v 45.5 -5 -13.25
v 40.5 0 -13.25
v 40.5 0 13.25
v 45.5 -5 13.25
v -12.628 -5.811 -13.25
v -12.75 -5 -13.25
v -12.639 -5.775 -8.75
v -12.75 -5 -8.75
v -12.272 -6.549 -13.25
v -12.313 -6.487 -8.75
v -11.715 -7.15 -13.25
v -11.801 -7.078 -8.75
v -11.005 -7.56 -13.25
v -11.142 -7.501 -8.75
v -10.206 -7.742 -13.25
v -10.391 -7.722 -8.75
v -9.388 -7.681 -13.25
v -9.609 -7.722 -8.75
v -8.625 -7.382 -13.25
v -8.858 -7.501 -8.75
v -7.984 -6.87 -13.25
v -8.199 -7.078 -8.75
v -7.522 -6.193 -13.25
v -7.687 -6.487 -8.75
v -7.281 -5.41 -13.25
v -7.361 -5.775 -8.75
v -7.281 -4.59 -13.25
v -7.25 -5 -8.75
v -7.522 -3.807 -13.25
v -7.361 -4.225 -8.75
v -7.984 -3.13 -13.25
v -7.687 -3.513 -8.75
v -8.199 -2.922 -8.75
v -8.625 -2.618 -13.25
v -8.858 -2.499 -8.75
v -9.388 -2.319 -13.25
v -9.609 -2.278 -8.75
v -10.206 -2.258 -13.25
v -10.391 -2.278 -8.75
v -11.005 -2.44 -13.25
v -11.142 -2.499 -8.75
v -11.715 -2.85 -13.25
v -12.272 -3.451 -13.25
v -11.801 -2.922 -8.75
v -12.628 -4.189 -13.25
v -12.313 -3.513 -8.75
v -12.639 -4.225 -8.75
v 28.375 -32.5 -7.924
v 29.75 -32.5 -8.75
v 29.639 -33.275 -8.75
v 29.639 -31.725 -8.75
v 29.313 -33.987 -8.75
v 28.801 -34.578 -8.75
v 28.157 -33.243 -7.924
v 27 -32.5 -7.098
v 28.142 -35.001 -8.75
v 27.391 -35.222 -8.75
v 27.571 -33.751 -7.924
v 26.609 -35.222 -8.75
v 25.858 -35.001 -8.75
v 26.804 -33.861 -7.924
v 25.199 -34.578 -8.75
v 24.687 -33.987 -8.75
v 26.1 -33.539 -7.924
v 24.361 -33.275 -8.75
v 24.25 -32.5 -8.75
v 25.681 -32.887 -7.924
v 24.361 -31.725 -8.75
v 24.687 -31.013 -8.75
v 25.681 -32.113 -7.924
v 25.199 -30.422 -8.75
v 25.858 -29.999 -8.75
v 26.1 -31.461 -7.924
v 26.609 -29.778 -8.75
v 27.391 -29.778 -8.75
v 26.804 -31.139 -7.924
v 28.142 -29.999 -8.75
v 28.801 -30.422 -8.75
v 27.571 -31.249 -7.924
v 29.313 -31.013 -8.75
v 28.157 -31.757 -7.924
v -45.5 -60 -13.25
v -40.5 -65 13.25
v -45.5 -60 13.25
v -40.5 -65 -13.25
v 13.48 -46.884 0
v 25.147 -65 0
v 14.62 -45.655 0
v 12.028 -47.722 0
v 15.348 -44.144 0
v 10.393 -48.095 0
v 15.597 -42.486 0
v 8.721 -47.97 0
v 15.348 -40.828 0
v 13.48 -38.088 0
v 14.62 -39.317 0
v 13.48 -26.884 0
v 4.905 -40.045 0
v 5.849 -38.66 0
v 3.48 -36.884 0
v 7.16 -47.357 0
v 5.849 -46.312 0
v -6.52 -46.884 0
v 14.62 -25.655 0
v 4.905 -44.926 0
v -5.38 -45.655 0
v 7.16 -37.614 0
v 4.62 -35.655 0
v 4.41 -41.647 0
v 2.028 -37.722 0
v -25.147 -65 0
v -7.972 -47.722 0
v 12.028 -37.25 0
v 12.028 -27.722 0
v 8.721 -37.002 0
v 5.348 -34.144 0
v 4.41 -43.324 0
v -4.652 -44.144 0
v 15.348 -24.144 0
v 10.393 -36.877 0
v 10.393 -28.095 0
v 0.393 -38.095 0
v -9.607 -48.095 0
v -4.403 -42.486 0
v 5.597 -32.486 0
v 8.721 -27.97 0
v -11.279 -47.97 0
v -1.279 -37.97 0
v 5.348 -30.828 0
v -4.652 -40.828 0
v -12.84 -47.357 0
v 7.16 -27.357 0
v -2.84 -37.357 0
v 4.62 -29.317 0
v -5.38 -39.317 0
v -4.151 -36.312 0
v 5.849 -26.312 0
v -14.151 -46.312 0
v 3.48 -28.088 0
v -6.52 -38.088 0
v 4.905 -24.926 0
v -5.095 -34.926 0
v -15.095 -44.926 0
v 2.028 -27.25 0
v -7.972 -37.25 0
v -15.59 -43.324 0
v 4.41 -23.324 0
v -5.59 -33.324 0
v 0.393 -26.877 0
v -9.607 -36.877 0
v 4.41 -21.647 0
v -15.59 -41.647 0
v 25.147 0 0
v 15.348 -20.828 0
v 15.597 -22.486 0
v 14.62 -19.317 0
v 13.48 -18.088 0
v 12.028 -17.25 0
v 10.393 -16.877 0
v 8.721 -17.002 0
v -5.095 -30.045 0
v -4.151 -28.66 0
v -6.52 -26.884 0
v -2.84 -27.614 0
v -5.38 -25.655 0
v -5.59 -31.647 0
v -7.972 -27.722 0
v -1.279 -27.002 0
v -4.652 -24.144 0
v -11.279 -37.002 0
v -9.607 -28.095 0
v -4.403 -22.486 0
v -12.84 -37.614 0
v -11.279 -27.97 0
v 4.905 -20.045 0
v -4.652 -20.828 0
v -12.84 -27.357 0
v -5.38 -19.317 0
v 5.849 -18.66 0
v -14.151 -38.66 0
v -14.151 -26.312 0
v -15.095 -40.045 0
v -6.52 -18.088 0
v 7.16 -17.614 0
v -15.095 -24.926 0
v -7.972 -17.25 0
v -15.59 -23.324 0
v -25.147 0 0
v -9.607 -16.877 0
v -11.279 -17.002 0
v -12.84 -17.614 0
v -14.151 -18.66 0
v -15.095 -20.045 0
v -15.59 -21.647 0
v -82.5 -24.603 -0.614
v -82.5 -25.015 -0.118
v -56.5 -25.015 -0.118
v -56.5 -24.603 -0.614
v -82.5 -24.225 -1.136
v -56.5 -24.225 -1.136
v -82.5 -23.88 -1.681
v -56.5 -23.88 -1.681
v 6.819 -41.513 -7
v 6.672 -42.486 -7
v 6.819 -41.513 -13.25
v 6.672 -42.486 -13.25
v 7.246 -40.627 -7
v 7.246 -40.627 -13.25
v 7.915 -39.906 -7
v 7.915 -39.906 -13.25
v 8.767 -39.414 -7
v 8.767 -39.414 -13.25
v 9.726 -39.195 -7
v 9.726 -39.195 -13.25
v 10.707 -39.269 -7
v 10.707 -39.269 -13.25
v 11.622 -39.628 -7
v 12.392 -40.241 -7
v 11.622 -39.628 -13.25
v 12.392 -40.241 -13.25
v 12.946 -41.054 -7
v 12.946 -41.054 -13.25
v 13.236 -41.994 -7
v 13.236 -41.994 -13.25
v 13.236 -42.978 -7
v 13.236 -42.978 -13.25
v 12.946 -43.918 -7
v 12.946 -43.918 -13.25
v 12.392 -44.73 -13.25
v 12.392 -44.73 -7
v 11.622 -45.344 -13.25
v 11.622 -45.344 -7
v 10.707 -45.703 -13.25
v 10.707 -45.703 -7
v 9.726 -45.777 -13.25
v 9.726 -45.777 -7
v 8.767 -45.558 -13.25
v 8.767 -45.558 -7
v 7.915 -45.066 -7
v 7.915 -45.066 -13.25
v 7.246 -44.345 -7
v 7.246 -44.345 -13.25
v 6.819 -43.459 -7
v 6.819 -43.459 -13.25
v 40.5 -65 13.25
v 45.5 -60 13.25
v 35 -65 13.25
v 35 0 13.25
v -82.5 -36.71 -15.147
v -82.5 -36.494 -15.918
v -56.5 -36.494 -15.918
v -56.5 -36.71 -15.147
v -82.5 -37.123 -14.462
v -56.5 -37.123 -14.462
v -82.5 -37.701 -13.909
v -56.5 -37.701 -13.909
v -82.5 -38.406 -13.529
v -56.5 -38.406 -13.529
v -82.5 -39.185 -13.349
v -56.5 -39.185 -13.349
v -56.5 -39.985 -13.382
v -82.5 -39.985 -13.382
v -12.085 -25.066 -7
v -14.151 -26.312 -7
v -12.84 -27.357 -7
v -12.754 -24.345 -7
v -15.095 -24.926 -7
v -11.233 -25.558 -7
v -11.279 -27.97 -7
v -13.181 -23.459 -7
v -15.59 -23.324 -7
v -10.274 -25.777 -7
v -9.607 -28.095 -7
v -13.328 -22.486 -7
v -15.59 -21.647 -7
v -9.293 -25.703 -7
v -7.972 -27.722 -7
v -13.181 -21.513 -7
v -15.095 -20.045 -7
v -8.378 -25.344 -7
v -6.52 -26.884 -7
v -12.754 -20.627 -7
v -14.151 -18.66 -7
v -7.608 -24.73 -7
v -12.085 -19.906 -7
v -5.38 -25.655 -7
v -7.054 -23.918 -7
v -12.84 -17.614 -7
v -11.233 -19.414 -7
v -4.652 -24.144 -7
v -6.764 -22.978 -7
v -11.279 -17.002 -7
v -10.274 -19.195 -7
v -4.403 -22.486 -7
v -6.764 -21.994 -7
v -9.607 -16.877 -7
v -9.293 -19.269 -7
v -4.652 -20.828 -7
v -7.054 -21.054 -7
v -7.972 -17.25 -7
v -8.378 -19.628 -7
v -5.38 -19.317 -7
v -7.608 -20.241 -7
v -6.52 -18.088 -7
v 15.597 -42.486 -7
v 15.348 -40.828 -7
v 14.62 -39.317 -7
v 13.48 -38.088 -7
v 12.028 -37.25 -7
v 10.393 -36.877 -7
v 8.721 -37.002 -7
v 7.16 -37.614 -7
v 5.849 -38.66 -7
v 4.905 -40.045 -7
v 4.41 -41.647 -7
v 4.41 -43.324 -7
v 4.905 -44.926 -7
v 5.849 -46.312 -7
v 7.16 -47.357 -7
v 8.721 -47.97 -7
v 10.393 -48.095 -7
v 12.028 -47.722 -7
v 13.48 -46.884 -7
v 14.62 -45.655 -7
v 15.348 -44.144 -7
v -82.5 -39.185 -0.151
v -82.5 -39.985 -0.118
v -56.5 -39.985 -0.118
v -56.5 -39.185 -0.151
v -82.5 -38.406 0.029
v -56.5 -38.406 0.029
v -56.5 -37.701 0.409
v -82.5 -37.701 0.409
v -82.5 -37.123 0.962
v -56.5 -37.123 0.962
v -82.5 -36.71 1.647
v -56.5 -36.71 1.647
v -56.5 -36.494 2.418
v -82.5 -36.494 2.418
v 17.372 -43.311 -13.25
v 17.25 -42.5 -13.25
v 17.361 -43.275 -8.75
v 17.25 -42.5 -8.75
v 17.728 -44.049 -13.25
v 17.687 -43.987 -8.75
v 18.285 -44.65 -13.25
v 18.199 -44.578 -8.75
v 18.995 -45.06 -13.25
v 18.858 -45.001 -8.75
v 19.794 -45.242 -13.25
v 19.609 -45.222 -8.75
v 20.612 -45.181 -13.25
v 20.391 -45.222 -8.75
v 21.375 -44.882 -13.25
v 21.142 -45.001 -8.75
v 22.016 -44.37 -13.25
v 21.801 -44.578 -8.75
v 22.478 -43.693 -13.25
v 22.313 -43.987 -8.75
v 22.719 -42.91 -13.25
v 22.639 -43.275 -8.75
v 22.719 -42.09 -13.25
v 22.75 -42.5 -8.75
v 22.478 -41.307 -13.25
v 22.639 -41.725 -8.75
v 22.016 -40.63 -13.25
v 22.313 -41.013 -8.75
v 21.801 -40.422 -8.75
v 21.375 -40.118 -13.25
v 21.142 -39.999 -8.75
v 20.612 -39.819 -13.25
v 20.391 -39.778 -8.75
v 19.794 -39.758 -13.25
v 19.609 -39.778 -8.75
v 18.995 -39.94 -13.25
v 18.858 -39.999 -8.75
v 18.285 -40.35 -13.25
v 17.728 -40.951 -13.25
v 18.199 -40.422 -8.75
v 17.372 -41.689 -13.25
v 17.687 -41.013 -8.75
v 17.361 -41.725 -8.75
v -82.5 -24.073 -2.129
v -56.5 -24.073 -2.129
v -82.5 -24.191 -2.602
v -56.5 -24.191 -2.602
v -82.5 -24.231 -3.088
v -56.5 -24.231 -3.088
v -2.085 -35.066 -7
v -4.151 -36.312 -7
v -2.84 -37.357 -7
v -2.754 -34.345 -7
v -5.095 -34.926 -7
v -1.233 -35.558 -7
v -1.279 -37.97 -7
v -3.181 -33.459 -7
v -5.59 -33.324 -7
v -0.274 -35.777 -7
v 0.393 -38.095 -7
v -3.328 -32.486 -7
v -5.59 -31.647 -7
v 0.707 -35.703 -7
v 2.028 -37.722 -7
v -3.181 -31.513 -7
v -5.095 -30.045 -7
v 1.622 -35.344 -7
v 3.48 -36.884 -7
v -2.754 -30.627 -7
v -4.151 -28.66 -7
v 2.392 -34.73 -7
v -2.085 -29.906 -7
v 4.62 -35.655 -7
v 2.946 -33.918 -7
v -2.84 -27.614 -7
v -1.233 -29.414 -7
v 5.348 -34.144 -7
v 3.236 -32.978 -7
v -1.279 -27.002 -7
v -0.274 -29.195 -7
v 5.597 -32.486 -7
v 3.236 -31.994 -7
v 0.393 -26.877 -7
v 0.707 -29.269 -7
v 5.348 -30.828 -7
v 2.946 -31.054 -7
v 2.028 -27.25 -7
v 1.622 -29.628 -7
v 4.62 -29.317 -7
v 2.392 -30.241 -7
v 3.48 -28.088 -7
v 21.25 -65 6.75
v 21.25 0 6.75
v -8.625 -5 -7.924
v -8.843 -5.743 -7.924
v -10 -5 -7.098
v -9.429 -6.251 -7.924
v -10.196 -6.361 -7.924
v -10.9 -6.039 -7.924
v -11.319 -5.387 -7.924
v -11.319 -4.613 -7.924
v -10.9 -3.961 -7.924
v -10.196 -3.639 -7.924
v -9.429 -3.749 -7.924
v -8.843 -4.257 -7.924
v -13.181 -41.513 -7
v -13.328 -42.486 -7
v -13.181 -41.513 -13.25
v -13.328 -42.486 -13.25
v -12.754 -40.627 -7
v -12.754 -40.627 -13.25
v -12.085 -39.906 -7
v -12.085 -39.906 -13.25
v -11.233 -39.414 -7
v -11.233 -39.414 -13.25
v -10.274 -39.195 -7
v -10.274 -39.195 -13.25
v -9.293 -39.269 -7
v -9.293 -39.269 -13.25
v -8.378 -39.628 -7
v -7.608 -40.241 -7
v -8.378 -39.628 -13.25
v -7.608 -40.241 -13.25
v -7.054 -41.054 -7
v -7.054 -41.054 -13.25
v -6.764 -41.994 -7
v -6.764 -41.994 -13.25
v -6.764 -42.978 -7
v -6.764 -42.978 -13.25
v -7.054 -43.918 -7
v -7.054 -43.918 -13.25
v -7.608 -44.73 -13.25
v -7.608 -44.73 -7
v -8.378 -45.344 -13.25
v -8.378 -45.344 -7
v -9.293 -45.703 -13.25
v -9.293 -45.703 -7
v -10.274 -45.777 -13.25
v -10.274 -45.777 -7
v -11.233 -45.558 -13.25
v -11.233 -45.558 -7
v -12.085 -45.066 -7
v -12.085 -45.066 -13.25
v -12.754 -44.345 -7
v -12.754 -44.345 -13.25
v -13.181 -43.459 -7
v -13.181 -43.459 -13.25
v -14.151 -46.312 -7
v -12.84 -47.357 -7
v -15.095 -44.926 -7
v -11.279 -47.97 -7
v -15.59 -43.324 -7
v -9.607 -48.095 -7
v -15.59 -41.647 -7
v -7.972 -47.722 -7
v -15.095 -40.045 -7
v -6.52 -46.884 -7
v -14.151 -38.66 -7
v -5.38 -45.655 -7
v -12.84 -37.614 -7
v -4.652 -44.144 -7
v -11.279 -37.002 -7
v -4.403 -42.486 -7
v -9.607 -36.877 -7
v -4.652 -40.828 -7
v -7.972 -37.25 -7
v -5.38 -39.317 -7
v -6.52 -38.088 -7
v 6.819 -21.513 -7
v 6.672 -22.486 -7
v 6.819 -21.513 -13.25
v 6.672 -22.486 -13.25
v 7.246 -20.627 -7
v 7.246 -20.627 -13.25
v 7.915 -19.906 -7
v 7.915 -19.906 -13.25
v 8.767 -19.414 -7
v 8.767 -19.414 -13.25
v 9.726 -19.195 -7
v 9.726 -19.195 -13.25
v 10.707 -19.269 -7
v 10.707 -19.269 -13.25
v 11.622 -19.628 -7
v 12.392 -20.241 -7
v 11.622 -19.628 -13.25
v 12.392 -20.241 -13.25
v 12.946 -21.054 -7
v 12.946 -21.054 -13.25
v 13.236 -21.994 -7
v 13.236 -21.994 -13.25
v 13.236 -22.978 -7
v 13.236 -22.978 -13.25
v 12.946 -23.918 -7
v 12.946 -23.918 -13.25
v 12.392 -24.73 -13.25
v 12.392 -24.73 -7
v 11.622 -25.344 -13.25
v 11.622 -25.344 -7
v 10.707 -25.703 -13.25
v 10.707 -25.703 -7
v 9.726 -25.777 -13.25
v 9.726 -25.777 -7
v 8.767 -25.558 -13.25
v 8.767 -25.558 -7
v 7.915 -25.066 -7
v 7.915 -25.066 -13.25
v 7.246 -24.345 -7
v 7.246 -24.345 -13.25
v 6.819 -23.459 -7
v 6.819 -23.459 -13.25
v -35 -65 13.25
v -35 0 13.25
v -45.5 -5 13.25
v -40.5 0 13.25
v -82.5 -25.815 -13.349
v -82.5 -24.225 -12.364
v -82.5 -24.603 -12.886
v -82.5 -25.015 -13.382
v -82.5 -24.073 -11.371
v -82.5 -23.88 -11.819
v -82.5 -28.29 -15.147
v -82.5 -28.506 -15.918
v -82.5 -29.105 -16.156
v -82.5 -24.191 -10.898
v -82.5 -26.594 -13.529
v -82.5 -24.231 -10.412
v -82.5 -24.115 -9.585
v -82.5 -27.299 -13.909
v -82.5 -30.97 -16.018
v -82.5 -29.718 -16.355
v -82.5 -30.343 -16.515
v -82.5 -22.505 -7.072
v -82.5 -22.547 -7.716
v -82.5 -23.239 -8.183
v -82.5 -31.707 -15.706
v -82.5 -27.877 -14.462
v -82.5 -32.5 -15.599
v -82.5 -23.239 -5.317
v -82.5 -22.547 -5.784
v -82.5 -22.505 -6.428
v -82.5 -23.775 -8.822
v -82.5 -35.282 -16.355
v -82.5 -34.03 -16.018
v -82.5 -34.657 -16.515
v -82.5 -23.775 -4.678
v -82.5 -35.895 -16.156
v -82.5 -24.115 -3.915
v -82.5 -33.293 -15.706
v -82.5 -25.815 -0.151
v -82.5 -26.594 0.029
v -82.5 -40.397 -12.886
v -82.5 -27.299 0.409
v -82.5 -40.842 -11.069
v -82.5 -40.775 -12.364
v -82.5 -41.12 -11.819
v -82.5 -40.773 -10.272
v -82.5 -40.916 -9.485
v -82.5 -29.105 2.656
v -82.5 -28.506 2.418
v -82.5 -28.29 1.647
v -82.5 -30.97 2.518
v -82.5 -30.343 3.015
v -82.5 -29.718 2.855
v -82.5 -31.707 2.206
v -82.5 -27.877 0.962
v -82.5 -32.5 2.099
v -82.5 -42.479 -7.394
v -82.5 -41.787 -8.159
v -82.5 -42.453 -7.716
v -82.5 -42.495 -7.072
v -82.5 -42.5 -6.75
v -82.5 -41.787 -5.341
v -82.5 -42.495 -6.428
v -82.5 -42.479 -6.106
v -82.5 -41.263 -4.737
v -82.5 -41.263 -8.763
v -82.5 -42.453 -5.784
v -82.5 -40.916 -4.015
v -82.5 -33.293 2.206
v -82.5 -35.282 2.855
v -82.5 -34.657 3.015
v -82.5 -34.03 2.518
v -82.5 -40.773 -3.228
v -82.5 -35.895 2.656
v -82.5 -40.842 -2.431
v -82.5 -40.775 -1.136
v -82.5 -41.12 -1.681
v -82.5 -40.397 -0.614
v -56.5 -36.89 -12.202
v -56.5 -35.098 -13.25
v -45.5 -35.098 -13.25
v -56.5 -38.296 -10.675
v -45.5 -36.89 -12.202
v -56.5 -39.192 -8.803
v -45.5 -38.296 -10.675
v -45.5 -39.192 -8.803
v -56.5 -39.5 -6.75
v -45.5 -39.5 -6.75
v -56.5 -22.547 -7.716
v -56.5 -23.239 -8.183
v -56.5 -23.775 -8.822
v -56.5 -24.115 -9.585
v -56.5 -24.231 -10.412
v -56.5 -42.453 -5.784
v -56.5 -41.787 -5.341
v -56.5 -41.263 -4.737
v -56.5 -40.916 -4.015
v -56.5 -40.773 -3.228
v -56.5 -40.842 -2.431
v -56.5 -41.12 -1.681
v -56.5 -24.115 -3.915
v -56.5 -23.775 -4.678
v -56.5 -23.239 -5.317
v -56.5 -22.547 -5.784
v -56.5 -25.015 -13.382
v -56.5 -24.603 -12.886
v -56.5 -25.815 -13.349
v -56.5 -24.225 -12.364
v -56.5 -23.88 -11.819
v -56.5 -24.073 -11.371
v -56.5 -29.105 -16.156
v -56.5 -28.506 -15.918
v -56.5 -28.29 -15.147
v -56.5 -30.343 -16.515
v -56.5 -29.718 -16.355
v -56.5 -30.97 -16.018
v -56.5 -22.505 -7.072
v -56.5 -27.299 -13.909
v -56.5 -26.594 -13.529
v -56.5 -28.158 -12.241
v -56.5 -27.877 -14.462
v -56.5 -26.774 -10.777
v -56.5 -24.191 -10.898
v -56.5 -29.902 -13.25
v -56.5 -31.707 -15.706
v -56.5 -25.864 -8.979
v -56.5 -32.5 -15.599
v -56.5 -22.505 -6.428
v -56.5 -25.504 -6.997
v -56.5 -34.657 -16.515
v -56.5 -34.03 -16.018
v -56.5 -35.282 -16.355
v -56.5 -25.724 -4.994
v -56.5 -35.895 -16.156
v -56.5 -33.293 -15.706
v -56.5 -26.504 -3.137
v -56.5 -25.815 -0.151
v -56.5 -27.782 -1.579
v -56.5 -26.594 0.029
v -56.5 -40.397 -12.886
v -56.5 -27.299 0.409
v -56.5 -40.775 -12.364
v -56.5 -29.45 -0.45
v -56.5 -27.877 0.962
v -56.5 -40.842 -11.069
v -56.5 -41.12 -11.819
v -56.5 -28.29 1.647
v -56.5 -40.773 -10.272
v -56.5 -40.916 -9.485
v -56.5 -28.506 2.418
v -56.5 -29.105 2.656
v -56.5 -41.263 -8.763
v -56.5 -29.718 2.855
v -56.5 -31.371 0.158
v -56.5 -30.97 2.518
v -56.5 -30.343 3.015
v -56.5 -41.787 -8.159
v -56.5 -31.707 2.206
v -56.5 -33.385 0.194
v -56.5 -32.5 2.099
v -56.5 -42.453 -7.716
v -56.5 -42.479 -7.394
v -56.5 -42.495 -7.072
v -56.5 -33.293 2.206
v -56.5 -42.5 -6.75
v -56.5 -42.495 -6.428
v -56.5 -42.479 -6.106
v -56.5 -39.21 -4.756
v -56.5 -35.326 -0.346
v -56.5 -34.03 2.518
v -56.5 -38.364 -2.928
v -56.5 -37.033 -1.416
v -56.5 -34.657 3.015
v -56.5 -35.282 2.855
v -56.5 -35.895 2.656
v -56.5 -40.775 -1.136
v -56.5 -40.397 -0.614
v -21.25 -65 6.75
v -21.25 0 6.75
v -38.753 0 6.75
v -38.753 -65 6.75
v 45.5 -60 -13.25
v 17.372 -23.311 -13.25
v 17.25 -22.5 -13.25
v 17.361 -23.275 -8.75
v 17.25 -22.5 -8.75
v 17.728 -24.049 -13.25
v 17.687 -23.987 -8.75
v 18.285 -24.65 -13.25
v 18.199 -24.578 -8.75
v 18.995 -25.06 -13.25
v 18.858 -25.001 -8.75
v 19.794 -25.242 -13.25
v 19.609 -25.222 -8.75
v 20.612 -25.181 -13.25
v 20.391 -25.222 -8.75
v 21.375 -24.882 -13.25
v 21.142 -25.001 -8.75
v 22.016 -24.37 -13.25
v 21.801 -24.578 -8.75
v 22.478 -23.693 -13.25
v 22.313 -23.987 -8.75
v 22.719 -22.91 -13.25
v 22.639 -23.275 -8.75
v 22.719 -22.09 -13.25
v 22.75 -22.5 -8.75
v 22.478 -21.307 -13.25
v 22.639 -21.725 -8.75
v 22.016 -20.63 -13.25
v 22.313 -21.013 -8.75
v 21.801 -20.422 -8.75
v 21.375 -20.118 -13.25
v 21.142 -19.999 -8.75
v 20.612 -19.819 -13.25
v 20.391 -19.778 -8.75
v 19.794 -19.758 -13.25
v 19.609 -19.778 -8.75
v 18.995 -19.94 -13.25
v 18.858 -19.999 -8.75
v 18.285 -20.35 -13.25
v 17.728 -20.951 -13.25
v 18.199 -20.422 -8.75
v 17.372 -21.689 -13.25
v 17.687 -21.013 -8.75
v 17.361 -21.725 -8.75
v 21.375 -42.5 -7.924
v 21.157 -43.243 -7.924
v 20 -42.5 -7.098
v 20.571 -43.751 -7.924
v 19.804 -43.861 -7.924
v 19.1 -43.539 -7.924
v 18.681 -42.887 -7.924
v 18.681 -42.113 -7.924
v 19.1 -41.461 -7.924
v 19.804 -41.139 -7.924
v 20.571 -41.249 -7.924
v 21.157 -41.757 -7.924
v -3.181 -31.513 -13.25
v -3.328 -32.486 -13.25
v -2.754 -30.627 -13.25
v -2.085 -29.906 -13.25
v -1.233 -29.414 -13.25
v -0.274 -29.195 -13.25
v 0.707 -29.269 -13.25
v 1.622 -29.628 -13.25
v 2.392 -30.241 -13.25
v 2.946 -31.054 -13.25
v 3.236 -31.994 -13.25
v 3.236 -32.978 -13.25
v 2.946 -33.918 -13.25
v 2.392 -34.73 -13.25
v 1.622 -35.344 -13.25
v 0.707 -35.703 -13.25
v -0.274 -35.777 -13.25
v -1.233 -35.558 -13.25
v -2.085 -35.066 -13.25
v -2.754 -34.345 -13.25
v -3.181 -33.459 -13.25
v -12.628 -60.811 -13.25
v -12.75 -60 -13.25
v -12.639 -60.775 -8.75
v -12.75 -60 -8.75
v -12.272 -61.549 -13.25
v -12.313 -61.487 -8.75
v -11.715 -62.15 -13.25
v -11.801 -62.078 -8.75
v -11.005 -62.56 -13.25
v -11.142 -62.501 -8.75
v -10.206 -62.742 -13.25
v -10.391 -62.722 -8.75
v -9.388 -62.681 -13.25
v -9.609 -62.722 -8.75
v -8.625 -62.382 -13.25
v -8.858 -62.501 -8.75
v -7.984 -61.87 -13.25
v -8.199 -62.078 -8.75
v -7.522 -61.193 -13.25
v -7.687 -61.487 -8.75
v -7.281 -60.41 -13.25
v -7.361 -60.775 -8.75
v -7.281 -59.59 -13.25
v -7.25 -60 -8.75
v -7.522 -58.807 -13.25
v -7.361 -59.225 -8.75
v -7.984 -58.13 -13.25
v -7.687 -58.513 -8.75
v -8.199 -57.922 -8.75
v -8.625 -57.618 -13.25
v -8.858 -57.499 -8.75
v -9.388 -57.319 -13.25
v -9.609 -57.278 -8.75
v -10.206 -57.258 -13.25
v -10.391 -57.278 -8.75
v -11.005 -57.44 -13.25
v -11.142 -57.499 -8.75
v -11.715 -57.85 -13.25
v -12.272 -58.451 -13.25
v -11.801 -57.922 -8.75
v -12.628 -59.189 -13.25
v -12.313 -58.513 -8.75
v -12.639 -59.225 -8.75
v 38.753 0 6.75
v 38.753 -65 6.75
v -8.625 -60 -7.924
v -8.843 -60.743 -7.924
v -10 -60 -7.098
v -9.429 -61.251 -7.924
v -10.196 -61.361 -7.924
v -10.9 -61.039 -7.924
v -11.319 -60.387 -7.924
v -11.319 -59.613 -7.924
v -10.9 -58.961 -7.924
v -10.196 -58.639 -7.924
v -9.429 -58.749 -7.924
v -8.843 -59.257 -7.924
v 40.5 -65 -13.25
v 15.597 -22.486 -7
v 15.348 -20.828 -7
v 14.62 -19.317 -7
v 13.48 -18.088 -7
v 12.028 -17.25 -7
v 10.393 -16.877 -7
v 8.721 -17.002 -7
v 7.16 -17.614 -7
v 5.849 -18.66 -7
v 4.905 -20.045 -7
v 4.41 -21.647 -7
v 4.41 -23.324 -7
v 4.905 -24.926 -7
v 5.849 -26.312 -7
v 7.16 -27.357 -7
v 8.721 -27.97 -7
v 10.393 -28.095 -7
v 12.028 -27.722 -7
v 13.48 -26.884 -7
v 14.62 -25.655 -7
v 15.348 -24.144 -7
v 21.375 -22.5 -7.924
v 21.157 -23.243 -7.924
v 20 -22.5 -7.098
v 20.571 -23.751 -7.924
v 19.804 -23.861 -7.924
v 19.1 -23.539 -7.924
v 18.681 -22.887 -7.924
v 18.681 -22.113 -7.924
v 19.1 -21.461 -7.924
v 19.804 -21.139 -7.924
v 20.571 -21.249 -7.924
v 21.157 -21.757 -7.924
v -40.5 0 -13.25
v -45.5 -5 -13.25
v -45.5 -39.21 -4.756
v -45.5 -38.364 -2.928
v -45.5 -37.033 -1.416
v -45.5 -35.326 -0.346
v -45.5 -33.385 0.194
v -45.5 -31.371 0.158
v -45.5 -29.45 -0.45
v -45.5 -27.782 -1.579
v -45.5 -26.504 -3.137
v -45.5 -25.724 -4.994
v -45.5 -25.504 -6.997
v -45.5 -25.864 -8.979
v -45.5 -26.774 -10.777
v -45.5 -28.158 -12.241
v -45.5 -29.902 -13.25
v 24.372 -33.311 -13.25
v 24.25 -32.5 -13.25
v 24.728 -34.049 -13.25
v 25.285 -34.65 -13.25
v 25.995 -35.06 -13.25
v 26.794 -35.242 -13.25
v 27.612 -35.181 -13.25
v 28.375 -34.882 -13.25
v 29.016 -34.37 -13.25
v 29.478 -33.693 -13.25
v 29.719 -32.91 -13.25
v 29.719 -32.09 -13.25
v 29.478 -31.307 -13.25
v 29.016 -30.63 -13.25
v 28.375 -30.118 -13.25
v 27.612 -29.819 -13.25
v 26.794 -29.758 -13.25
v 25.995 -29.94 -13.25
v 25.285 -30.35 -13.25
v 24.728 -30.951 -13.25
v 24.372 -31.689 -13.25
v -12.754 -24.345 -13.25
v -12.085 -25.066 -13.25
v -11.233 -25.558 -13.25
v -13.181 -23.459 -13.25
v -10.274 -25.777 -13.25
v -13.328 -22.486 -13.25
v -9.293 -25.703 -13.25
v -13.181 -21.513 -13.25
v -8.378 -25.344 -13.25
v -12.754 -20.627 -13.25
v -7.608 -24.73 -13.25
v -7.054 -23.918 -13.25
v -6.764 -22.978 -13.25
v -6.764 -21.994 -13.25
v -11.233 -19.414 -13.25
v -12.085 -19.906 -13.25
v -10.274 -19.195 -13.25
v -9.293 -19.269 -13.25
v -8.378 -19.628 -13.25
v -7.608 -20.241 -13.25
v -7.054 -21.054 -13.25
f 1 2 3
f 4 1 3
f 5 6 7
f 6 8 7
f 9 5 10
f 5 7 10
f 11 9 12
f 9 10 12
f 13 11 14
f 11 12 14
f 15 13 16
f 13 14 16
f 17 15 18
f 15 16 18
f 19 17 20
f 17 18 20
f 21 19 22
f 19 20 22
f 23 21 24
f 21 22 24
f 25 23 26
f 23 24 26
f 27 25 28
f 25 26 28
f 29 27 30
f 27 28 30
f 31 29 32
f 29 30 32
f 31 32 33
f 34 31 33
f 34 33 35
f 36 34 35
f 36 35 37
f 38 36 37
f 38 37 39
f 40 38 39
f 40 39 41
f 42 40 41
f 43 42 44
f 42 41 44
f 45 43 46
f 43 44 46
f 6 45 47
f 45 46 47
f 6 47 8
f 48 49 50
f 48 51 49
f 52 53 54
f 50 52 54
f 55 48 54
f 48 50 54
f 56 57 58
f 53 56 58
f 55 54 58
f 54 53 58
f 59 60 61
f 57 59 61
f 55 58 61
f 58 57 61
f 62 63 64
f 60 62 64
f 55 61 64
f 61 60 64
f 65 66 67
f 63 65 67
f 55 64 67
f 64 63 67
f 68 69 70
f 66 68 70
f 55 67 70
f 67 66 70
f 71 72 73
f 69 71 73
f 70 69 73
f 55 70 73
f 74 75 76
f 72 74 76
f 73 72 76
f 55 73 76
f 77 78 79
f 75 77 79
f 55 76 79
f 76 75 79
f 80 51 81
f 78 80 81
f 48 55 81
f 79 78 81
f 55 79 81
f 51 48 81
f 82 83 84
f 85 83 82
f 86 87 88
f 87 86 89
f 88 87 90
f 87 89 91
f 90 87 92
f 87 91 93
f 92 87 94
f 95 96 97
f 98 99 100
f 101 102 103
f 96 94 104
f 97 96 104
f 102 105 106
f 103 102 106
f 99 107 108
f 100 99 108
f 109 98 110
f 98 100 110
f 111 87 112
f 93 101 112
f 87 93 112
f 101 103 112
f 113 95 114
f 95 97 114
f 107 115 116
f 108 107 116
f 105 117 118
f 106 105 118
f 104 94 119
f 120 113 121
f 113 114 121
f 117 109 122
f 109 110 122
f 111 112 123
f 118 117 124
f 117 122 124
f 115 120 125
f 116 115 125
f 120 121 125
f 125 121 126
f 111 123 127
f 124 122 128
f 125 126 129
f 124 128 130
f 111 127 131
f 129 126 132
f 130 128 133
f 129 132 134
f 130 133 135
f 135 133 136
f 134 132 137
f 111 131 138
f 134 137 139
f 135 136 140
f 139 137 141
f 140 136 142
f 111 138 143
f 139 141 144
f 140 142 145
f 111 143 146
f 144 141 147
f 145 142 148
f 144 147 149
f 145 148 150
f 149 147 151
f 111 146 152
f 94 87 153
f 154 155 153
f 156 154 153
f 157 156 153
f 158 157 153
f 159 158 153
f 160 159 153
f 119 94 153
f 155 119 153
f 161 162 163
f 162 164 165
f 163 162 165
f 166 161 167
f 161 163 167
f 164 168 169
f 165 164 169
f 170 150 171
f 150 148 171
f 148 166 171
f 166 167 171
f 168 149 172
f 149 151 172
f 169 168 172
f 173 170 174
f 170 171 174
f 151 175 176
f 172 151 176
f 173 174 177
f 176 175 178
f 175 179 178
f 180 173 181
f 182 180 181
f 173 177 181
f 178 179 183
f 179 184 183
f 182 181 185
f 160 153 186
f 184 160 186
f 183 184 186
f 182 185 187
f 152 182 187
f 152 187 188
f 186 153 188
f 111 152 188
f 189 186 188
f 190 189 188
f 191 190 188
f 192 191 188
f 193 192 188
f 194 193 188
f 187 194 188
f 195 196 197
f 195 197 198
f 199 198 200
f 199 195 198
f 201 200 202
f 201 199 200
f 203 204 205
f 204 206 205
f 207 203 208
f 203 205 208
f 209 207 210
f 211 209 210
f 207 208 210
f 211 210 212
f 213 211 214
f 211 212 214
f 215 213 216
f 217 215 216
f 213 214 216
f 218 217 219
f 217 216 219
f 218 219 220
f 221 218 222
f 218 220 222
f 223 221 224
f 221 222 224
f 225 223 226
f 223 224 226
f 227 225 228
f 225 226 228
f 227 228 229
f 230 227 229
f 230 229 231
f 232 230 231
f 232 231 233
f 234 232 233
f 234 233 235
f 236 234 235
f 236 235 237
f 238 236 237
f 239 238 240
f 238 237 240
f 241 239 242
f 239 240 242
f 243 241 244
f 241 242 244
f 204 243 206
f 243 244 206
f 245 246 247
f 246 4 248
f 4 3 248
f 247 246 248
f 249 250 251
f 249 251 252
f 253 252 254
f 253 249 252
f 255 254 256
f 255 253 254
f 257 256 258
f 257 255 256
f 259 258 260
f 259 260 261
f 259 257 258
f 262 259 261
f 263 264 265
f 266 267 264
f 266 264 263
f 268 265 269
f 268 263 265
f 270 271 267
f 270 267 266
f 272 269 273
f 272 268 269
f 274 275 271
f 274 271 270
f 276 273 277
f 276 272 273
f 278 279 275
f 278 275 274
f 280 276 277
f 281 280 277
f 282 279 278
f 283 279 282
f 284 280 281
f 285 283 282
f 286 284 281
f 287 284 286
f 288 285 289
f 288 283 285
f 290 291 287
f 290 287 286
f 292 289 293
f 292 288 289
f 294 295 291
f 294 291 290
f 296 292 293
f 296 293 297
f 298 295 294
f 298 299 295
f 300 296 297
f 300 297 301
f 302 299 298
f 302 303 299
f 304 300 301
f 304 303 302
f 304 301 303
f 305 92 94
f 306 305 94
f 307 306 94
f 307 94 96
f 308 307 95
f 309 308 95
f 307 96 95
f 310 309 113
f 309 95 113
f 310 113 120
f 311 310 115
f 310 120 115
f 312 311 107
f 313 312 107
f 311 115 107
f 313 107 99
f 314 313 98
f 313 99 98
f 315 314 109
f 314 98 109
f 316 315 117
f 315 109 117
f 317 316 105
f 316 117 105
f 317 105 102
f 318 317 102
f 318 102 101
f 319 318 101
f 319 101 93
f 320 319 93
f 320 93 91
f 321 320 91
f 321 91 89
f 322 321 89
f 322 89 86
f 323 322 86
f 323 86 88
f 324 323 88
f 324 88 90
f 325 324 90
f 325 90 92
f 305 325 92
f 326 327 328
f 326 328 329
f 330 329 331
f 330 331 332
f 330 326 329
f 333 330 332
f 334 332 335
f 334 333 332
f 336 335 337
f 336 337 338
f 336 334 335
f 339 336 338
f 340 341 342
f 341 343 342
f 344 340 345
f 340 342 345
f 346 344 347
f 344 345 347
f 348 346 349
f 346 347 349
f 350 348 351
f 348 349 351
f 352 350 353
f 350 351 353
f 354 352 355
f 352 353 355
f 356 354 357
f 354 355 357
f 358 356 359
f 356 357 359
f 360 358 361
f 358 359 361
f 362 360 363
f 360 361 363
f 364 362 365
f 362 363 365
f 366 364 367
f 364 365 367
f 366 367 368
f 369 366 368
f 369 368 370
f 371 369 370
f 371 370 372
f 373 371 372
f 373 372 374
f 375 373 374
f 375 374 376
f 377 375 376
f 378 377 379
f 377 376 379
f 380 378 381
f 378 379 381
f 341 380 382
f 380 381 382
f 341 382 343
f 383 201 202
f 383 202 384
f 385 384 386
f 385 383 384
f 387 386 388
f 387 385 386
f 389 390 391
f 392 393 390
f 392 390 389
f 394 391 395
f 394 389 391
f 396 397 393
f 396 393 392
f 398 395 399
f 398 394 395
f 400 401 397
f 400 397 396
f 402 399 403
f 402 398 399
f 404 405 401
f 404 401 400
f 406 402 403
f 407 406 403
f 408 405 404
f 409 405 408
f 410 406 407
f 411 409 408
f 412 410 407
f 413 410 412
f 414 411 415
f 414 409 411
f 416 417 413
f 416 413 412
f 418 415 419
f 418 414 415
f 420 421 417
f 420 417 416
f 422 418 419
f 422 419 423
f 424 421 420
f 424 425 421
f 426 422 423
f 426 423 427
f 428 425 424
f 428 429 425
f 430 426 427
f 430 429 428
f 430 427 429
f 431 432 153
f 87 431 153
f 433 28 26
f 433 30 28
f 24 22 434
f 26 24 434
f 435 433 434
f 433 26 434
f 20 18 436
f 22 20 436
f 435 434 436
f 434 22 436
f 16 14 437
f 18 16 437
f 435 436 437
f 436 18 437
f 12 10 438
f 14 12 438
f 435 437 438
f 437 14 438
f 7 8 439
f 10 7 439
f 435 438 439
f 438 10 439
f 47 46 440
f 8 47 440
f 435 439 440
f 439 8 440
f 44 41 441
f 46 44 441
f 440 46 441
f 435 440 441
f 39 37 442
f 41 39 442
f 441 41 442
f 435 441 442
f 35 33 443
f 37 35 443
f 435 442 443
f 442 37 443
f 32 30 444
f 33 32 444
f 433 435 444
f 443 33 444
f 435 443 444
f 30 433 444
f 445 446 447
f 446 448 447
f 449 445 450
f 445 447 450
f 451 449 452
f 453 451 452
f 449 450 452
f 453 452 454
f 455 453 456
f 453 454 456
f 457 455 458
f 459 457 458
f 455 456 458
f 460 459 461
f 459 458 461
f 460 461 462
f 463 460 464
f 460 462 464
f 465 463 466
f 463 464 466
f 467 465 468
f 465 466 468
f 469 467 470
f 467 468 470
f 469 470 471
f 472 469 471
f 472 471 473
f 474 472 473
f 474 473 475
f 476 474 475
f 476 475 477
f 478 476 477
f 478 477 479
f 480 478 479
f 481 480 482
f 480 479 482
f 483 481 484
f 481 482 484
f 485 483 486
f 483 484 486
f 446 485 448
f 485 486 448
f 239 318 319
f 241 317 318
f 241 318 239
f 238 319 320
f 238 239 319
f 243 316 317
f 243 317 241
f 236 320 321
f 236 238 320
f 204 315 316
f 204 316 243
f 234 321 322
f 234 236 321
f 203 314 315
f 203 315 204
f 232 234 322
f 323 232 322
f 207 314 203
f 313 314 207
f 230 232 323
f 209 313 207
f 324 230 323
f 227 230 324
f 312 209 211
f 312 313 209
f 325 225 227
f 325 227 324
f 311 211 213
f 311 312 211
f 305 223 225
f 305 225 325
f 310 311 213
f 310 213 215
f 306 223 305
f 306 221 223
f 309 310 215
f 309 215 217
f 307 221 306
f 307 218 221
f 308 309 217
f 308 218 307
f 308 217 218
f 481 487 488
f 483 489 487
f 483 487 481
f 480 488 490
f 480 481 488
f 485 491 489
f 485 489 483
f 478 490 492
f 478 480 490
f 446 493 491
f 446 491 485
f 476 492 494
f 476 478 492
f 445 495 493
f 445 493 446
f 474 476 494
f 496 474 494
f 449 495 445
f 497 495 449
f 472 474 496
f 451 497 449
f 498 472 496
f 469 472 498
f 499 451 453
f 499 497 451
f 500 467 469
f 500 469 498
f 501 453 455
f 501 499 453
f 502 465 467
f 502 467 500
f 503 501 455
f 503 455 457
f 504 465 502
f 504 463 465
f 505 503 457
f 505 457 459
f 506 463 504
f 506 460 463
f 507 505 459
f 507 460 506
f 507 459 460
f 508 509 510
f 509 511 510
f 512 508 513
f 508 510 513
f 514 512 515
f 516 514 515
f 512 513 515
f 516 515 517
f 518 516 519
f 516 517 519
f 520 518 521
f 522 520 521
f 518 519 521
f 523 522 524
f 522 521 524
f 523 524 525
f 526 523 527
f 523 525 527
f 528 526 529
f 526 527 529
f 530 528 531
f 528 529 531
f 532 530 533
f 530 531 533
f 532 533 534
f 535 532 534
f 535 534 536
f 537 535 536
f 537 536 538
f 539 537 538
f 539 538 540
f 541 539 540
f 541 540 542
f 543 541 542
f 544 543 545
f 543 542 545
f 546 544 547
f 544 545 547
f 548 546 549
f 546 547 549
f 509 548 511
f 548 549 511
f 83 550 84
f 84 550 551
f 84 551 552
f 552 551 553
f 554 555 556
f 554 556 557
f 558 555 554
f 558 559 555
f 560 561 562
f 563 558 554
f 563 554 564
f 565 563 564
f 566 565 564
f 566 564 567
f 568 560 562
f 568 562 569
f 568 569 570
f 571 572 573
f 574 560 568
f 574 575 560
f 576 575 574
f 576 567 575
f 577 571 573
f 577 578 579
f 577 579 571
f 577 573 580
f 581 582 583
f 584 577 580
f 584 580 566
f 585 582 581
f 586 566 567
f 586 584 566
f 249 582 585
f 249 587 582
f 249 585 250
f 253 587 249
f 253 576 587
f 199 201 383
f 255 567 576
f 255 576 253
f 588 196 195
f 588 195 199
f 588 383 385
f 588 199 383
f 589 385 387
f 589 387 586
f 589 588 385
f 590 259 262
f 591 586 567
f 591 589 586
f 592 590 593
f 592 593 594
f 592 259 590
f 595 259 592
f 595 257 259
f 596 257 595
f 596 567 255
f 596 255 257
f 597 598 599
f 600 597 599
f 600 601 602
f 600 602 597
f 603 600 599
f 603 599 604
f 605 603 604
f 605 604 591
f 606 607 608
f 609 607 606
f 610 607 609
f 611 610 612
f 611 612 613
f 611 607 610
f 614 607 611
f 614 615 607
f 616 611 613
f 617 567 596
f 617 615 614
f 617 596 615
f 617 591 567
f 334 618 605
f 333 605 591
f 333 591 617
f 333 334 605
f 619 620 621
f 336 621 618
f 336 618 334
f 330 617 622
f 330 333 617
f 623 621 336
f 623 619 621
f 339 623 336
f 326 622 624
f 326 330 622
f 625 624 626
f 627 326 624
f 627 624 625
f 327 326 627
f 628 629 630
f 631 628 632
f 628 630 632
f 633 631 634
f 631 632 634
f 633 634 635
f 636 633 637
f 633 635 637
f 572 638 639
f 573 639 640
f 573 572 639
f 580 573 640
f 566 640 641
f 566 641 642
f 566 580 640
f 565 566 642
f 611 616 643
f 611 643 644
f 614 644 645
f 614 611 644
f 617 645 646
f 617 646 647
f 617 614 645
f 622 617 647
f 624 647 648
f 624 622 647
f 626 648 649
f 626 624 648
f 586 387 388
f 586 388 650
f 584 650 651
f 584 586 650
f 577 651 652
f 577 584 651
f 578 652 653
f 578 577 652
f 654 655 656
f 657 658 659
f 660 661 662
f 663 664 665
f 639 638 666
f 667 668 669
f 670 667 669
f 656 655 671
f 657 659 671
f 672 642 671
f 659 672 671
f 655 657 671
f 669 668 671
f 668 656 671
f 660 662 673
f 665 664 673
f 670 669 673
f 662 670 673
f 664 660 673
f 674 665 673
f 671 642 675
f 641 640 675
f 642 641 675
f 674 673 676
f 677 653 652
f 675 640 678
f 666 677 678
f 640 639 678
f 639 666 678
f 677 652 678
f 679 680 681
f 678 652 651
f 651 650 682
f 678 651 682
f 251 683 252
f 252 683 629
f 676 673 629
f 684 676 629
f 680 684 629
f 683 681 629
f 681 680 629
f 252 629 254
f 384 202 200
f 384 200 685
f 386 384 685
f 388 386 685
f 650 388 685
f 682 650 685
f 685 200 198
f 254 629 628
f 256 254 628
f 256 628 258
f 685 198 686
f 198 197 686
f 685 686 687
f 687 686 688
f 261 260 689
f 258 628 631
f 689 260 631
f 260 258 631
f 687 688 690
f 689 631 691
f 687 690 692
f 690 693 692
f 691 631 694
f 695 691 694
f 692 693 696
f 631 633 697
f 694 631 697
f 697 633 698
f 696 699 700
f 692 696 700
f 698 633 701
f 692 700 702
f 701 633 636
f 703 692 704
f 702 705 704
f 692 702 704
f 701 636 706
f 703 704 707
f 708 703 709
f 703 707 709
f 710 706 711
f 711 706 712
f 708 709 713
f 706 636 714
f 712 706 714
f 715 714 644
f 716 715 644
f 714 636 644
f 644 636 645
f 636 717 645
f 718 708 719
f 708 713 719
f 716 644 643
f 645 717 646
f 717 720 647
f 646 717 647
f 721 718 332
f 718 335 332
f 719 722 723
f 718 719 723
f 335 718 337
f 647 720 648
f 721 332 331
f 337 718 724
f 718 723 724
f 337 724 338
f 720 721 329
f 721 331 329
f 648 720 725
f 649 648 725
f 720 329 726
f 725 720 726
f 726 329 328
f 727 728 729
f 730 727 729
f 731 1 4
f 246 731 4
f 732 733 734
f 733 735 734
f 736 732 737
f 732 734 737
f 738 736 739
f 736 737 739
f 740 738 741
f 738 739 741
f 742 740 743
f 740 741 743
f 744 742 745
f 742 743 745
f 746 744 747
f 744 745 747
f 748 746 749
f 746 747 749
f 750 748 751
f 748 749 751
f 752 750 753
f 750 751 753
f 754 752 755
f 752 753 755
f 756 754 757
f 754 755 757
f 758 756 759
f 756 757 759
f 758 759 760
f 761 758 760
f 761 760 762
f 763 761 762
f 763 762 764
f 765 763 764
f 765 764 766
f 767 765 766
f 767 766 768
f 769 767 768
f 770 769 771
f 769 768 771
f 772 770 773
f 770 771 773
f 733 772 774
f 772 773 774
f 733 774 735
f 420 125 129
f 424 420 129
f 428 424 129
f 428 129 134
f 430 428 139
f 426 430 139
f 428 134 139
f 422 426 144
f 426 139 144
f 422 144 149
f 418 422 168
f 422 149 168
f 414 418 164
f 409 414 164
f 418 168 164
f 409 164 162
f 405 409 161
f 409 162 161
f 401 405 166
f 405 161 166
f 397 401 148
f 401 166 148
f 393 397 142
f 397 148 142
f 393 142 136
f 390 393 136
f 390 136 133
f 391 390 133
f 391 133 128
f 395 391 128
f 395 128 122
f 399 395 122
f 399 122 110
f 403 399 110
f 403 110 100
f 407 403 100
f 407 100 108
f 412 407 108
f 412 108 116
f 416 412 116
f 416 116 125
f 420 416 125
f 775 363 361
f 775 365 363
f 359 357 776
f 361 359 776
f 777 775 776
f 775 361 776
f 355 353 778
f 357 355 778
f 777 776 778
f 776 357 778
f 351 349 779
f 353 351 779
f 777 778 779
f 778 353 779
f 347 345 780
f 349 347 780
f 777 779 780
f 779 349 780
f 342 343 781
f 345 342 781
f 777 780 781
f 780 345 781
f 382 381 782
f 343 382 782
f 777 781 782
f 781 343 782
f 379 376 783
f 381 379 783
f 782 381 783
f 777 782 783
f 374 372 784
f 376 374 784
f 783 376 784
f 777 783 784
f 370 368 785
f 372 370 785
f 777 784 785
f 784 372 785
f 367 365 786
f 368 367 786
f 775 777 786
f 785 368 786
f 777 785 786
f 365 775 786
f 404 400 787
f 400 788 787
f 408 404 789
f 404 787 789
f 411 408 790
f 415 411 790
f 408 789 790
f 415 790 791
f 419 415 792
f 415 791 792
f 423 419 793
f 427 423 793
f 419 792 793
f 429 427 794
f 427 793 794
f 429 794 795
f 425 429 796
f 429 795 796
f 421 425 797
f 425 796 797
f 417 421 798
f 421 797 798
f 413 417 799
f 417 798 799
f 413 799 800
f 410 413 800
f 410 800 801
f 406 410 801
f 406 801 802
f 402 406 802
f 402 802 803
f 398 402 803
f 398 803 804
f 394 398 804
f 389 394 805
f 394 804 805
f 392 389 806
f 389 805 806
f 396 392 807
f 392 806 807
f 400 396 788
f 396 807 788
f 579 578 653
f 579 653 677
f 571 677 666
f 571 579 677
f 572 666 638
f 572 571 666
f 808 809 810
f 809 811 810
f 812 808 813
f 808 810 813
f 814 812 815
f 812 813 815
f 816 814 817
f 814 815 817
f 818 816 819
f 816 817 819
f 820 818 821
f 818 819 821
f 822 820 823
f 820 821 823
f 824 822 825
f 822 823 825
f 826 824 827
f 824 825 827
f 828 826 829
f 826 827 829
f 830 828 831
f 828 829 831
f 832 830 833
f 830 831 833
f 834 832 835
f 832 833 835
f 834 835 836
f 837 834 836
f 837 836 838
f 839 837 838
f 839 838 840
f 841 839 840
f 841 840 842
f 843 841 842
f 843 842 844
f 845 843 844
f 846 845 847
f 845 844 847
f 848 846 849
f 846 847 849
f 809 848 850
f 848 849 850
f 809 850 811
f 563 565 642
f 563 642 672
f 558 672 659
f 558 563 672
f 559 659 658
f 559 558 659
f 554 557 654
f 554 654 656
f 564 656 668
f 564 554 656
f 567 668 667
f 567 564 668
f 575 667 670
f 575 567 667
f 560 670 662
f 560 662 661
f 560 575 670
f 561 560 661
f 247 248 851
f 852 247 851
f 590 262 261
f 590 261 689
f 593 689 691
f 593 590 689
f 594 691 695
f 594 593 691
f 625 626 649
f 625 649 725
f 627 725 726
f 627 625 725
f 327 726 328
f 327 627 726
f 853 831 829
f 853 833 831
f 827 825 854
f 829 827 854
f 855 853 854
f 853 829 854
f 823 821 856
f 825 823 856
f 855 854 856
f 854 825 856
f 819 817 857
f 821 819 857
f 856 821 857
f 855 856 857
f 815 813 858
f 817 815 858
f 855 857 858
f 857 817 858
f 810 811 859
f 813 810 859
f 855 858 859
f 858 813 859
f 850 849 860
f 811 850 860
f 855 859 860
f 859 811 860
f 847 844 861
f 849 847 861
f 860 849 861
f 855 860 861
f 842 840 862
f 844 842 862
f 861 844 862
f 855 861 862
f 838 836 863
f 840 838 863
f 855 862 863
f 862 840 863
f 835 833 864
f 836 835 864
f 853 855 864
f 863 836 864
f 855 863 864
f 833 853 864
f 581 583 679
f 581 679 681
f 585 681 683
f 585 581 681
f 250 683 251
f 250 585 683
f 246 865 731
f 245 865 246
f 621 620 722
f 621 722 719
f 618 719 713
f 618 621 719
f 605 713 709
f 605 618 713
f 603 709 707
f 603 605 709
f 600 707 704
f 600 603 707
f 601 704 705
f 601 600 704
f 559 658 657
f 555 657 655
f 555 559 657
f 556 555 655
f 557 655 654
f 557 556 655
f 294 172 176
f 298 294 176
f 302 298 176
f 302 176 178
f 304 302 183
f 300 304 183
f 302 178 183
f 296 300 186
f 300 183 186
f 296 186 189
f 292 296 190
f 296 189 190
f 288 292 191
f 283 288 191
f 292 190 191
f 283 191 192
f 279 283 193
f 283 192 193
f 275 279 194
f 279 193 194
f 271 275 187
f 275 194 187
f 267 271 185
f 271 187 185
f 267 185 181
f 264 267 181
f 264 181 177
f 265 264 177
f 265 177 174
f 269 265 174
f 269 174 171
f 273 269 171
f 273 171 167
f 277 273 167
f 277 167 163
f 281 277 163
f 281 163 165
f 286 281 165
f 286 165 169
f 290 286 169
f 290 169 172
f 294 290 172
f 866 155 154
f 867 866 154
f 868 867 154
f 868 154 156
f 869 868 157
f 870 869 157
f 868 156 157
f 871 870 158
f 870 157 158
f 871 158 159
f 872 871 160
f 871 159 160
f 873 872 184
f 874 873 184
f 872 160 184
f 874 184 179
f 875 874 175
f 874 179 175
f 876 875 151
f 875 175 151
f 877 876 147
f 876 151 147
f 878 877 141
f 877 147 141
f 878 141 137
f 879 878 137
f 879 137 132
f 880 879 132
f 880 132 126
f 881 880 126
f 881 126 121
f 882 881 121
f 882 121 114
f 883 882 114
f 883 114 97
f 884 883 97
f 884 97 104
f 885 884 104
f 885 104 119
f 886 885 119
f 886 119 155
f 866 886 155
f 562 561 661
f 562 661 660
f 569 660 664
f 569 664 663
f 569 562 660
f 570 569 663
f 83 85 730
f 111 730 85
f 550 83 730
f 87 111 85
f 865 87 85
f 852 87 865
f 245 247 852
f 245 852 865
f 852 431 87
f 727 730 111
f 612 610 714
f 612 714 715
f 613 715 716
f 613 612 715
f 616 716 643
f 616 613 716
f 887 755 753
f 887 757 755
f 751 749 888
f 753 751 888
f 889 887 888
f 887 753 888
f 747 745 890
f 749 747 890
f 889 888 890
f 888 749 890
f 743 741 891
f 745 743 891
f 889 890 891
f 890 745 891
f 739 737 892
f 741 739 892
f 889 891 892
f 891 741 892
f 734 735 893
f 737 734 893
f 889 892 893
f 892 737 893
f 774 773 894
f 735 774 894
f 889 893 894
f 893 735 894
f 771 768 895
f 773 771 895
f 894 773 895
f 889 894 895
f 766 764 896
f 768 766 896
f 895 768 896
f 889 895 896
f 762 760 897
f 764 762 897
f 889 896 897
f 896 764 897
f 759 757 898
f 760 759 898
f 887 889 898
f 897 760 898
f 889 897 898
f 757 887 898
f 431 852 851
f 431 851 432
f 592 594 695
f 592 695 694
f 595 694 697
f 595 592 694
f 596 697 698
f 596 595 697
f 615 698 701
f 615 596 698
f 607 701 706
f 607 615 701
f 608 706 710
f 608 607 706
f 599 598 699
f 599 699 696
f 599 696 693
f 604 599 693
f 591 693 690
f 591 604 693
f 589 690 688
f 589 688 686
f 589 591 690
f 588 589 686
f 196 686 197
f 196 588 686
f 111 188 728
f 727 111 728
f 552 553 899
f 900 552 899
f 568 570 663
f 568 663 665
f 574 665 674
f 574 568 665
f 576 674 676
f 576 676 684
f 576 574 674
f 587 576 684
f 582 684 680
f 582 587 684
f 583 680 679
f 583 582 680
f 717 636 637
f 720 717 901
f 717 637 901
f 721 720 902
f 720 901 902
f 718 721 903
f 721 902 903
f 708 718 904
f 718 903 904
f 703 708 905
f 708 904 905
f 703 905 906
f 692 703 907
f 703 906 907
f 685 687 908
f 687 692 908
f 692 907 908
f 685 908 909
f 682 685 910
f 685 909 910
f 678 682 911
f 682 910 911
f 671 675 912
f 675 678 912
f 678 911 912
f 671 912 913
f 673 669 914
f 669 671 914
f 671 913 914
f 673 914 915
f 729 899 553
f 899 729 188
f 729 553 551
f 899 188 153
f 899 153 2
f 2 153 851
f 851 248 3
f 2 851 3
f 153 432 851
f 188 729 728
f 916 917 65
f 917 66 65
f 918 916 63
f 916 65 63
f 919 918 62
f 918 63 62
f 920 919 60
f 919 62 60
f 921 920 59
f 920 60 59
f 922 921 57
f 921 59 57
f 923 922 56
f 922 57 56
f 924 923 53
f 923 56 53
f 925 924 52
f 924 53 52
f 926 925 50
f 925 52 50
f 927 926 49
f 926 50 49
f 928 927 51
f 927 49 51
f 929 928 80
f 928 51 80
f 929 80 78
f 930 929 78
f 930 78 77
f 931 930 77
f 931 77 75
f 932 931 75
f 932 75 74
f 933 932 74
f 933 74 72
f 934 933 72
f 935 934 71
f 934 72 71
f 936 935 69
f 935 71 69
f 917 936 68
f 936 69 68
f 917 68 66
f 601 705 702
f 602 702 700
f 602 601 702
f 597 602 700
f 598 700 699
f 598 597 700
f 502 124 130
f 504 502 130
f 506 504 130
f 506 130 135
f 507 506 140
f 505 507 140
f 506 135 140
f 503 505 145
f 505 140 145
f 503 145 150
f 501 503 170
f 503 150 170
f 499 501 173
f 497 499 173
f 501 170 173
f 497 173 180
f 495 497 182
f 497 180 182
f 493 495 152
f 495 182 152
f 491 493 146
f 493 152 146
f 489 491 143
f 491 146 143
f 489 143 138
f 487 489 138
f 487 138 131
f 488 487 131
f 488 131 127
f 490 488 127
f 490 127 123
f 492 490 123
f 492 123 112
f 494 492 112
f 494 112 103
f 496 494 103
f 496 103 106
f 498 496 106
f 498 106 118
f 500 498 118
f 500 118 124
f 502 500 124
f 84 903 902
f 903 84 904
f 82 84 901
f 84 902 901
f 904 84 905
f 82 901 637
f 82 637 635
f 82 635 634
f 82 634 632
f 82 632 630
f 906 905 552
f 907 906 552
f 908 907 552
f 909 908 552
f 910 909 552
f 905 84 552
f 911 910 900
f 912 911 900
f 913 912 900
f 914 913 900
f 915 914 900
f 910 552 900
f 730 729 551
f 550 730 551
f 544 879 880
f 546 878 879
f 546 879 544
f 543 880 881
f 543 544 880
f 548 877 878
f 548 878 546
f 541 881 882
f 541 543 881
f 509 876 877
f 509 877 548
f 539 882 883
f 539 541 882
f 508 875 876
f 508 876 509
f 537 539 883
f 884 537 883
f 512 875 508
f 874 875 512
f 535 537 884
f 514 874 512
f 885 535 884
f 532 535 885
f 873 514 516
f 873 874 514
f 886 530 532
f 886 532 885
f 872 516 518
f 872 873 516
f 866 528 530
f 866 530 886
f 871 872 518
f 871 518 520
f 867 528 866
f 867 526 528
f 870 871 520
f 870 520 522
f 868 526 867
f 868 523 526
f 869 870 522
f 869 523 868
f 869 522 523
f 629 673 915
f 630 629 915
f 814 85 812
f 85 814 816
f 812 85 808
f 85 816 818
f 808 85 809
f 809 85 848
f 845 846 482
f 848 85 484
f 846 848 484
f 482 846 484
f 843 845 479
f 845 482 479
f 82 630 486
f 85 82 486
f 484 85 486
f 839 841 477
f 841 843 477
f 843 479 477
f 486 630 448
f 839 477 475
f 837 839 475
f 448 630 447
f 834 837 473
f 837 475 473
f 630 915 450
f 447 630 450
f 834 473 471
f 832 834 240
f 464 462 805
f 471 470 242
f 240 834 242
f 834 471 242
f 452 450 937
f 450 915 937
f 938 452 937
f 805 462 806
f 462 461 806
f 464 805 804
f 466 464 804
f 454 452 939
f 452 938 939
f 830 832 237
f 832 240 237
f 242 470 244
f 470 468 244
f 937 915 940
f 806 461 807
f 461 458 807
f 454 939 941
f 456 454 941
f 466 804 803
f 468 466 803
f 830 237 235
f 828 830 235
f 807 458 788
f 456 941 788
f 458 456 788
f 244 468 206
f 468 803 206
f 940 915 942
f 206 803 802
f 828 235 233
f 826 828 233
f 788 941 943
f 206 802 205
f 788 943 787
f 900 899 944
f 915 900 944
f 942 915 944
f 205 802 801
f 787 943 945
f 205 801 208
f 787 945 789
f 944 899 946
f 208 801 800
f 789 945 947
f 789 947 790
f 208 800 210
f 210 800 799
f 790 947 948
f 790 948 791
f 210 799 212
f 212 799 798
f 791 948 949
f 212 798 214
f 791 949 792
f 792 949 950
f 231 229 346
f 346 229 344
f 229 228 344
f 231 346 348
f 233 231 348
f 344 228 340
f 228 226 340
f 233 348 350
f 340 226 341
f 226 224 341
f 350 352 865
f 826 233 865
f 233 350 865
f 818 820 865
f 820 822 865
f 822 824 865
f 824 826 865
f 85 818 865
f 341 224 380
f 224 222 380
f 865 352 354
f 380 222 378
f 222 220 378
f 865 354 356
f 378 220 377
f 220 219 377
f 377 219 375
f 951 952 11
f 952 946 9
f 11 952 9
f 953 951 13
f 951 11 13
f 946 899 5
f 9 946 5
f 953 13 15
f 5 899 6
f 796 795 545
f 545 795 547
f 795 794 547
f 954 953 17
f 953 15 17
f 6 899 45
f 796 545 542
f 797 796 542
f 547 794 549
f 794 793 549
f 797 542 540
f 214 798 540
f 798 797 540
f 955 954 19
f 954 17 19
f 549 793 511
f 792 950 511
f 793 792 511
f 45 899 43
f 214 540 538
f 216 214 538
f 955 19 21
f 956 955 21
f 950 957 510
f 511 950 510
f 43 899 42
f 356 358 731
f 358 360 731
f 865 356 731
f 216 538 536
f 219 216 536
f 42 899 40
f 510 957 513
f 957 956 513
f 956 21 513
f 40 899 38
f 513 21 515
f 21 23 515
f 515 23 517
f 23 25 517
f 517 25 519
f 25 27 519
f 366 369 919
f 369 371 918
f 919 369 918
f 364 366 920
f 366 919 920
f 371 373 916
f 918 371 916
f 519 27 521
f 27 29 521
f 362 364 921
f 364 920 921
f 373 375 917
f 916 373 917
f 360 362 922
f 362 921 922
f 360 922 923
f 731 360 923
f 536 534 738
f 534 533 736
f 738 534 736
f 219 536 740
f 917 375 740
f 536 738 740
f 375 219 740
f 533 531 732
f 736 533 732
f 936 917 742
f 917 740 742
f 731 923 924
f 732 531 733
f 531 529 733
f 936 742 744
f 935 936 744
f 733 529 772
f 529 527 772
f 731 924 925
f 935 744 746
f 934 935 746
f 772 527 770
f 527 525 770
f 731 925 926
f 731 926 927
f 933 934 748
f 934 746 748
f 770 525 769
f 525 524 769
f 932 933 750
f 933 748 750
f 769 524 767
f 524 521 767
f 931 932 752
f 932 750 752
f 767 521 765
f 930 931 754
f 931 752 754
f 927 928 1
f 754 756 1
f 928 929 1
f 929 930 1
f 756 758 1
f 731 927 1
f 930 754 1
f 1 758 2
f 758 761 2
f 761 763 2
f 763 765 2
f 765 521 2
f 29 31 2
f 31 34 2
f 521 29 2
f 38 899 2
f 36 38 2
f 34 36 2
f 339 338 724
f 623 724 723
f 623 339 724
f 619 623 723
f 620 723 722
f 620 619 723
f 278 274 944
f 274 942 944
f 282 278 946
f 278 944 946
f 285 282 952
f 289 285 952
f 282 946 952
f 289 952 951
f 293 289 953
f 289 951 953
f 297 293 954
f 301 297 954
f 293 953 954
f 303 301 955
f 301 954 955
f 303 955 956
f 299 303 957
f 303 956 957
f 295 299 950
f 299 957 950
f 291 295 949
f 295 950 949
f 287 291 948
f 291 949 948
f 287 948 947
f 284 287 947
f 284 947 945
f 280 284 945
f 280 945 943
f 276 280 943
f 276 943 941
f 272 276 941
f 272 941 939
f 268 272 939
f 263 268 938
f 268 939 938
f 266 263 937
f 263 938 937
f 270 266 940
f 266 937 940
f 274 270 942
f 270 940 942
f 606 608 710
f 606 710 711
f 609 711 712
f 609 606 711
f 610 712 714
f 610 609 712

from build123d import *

# Parameters (mm, degrees)
F1_DEPTH       = 65
F2_SIZE        = 5
F5_D           = 6.6
F5_CBORE_D     = 11.25
F5_CBORE_DEPTH = 7
F6_D           = 5.5
F6_DEPTH       = 4.5
F6_TIP         = 1.6523667023
F8_DEPTH       = 37
F10_DEPTH      = 26


with BuildPart() as f1:
    # F0 (on Front) → F1 (new body)
    with BuildSketch(Plane.XZ):
        Polygon((45.5, -13.25), (45.5, 13.25), (35, 13.25), (38.7527767497, 6.75), (21.25, 6.75), (25.147114317, 0), (0, 0), (-25.147114317, 0), (-21.25, 6.75), (-38.7527767497, 6.75), (-35, 13.25), (-45.5, 13.25), (-45.5, -13.25), align=None)
    extrude(amount=F1_DEPTH)

    # F2
    f2_edges = [f1.edges().sort_by_distance(p)[0] for p in [
        (45.5, -65, 0),
        (45.5, 0, 0),
        (-45.5, -65, 0),
        (-45.5, 0, 0),
    ]]
    chamfer(f2_edges, length=F2_SIZE)

    # F5 (through all)
    with Locations(Plane.XY):
        with Locations((9.9724601813, -22.4858294427), (-10.0275398187, -22.4858294427), (-10.0275398187, -42.4858294427), (9.9724601813, -42.4858294427), (-0.0275398187, -32.4858294427)):
            CounterBoreHole(F5_D / 2, F5_CBORE_D / 2, F5_CBORE_DEPTH)

    # F6
    with Locations(Plane(origin=(0, 0, -13.25), x_dir=(1, 0, 0), z_dir=(0, 0, -1))):
        with Locations((27, 32.5), (20, 22.5), (20, 42.5), (-10, 5), (-10, 60)):
            Hole(F6_D / 2, depth=F6_DEPTH)
            with Locations((0, 0, -(F6_DEPTH + F6_TIP / 2))):  # 118° drill point
                Cone(0, F6_D / 2, F6_TIP, mode=Mode.SUBTRACT)



with BuildPart() as f8:
    # F7 (on face) → F8 (new body)
    with BuildSketch(Plane(origin=(-45.5, 0, 0), x_dir=(0, -1, 0), z_dir=(-1, 0, 0))):
        with BuildLine():
            ThreePointArc((35.0980762114, -13.25), (38.2959698705, -10.6751411771), (39.5, -6.75))
            ThreePointArc((39.5, -6.75), (28.5748588229, -0.9540301295), (29.9019237886, -13.25))
            Line((29.9019237886, -13.25), (35.0980762114, -13.25))
        make_face()
    extrude(amount=F8_DEPTH)


with BuildPart() as f1_1:
    add(f1.part)

    add(f8.part)  # F10 merges F8
    # F9 (on face) → F10 (join)
    with BuildSketch(Plane(origin=(-82.5, 0, 0), x_dir=(0, -1, 0), z_dir=(-1, 0, 0))):
        with BuildLine():
            ThreePointArc((42.4532659811, -7.7156584847), (42.4883096621, -7.2333943467), (42.5, -6.75))
            ThreePointArc((42.5, -6.75), (42.4883096621, -6.2666056533), (42.4532659811, -5.7843415153))
            ThreePointArc((42.4532659811, -5.7843415153), (40.9160983506, -4.0154438804), (41.1199611443, -1.680851169))
            ThreePointArc((41.1199611443, -1.680851169), (40.5901699437, -0.8721474771), (39.9847615122, -0.1183829193))
            ThreePointArc((39.9847615122, -0.1183829193), (37.7014348334, 0.4091608651), (36.4941241321, 2.4177135872))
            ThreePointArc((36.4941241321, 2.4177135872), (35.5901699437, 2.760565163), (34.6573325433, 3.0145233523))
            ThreePointArc((34.6573325433, 3.0145233523), (32.5, 2.0992094912), (30.3426674567, 3.0145233523))
            ThreePointArc((30.3426674567, 3.0145233523), (29.4098300563, 2.760565163), (28.5058758679, 2.4177135872))
            ThreePointArc((28.5058758679, 2.4177135872), (27.2985651666, 0.4091608651), (25.0152384878, -0.1183829193))
            ThreePointArc((25.0152384878, -0.1183829193), (24.4098300563, -0.8721474771), (23.8800388557, -1.680851169))
            ThreePointArc((23.8800388557, -1.680851169), (24.141738822, -2.3631068384), (24.2307321005, -3.0883928973))
            ThreePointArc((24.2307321005, -3.0883928973), (23.775138294, -4.6777314775), (22.5467340189, -5.7843415153))
            ThreePointArc((22.5467340189, -5.7843415153), (22.5, -6.75), (22.5467340189, -7.7156584847))
            ThreePointArc((22.5467340189, -7.7156584847), (23.775138294, -8.8222685225), (24.2307321005, -10.4116071027))
            ThreePointArc((24.2307321005, -10.4116071027), (24.141738822, -11.1368931616), (23.8800388557, -11.819148831))
            ThreePointArc((23.8800388557, -11.819148831), (24.4098300563, -12.6278525229), (25.0152384878, -13.3816170807))
            ThreePointArc((25.0152384878, -13.3816170807), (27.2985651666, -13.9091608651), (28.5058758679, -15.9177135872))
            ThreePointArc((28.5058758679, -15.9177135872), (29.4098300563, -16.260565163), (30.3426674567, -16.5145233523))
            ThreePointArc((30.3426674567, -16.5145233523), (32.5, -15.5992094912), (34.6573325433, -16.5145233523))
            ThreePointArc((34.6573325433, -16.5145233523), (35.5901699437, -16.260565163), (36.4941241321, -15.9177135872))
            ThreePointArc((36.4941241321, -15.9177135872), (37.7014348334, -13.9091608651), (39.9847615122, -13.3816170807))
            ThreePointArc((39.9847615122, -13.3816170807), (40.5901699437, -12.6278525229), (41.1199611443, -11.819148831))
            ThreePointArc((41.1199611443, -11.819148831), (40.9160983506, -9.4845561196), (42.4532659811, -7.7156584847))
        make_face()
        with BuildLine():
            ThreePointArc((29.9019237886, -13.25), (32.5, 0.25), (35.0980762114, -13.25))
            Line((35.0980762114, -13.25), (29.9019237886, -13.25))
        make_face(mode=Mode.SUBTRACT)
        with BuildLine():
            Line((29.9019237886, -13.25), (35.0980762114, -13.25))
            ThreePointArc((35.0980762114, -13.25), (32.5, 0.25), (29.9019237886, -13.25))
        make_face()
    extrude(amount=-F10_DEPTH)


solid = f1_1.part
